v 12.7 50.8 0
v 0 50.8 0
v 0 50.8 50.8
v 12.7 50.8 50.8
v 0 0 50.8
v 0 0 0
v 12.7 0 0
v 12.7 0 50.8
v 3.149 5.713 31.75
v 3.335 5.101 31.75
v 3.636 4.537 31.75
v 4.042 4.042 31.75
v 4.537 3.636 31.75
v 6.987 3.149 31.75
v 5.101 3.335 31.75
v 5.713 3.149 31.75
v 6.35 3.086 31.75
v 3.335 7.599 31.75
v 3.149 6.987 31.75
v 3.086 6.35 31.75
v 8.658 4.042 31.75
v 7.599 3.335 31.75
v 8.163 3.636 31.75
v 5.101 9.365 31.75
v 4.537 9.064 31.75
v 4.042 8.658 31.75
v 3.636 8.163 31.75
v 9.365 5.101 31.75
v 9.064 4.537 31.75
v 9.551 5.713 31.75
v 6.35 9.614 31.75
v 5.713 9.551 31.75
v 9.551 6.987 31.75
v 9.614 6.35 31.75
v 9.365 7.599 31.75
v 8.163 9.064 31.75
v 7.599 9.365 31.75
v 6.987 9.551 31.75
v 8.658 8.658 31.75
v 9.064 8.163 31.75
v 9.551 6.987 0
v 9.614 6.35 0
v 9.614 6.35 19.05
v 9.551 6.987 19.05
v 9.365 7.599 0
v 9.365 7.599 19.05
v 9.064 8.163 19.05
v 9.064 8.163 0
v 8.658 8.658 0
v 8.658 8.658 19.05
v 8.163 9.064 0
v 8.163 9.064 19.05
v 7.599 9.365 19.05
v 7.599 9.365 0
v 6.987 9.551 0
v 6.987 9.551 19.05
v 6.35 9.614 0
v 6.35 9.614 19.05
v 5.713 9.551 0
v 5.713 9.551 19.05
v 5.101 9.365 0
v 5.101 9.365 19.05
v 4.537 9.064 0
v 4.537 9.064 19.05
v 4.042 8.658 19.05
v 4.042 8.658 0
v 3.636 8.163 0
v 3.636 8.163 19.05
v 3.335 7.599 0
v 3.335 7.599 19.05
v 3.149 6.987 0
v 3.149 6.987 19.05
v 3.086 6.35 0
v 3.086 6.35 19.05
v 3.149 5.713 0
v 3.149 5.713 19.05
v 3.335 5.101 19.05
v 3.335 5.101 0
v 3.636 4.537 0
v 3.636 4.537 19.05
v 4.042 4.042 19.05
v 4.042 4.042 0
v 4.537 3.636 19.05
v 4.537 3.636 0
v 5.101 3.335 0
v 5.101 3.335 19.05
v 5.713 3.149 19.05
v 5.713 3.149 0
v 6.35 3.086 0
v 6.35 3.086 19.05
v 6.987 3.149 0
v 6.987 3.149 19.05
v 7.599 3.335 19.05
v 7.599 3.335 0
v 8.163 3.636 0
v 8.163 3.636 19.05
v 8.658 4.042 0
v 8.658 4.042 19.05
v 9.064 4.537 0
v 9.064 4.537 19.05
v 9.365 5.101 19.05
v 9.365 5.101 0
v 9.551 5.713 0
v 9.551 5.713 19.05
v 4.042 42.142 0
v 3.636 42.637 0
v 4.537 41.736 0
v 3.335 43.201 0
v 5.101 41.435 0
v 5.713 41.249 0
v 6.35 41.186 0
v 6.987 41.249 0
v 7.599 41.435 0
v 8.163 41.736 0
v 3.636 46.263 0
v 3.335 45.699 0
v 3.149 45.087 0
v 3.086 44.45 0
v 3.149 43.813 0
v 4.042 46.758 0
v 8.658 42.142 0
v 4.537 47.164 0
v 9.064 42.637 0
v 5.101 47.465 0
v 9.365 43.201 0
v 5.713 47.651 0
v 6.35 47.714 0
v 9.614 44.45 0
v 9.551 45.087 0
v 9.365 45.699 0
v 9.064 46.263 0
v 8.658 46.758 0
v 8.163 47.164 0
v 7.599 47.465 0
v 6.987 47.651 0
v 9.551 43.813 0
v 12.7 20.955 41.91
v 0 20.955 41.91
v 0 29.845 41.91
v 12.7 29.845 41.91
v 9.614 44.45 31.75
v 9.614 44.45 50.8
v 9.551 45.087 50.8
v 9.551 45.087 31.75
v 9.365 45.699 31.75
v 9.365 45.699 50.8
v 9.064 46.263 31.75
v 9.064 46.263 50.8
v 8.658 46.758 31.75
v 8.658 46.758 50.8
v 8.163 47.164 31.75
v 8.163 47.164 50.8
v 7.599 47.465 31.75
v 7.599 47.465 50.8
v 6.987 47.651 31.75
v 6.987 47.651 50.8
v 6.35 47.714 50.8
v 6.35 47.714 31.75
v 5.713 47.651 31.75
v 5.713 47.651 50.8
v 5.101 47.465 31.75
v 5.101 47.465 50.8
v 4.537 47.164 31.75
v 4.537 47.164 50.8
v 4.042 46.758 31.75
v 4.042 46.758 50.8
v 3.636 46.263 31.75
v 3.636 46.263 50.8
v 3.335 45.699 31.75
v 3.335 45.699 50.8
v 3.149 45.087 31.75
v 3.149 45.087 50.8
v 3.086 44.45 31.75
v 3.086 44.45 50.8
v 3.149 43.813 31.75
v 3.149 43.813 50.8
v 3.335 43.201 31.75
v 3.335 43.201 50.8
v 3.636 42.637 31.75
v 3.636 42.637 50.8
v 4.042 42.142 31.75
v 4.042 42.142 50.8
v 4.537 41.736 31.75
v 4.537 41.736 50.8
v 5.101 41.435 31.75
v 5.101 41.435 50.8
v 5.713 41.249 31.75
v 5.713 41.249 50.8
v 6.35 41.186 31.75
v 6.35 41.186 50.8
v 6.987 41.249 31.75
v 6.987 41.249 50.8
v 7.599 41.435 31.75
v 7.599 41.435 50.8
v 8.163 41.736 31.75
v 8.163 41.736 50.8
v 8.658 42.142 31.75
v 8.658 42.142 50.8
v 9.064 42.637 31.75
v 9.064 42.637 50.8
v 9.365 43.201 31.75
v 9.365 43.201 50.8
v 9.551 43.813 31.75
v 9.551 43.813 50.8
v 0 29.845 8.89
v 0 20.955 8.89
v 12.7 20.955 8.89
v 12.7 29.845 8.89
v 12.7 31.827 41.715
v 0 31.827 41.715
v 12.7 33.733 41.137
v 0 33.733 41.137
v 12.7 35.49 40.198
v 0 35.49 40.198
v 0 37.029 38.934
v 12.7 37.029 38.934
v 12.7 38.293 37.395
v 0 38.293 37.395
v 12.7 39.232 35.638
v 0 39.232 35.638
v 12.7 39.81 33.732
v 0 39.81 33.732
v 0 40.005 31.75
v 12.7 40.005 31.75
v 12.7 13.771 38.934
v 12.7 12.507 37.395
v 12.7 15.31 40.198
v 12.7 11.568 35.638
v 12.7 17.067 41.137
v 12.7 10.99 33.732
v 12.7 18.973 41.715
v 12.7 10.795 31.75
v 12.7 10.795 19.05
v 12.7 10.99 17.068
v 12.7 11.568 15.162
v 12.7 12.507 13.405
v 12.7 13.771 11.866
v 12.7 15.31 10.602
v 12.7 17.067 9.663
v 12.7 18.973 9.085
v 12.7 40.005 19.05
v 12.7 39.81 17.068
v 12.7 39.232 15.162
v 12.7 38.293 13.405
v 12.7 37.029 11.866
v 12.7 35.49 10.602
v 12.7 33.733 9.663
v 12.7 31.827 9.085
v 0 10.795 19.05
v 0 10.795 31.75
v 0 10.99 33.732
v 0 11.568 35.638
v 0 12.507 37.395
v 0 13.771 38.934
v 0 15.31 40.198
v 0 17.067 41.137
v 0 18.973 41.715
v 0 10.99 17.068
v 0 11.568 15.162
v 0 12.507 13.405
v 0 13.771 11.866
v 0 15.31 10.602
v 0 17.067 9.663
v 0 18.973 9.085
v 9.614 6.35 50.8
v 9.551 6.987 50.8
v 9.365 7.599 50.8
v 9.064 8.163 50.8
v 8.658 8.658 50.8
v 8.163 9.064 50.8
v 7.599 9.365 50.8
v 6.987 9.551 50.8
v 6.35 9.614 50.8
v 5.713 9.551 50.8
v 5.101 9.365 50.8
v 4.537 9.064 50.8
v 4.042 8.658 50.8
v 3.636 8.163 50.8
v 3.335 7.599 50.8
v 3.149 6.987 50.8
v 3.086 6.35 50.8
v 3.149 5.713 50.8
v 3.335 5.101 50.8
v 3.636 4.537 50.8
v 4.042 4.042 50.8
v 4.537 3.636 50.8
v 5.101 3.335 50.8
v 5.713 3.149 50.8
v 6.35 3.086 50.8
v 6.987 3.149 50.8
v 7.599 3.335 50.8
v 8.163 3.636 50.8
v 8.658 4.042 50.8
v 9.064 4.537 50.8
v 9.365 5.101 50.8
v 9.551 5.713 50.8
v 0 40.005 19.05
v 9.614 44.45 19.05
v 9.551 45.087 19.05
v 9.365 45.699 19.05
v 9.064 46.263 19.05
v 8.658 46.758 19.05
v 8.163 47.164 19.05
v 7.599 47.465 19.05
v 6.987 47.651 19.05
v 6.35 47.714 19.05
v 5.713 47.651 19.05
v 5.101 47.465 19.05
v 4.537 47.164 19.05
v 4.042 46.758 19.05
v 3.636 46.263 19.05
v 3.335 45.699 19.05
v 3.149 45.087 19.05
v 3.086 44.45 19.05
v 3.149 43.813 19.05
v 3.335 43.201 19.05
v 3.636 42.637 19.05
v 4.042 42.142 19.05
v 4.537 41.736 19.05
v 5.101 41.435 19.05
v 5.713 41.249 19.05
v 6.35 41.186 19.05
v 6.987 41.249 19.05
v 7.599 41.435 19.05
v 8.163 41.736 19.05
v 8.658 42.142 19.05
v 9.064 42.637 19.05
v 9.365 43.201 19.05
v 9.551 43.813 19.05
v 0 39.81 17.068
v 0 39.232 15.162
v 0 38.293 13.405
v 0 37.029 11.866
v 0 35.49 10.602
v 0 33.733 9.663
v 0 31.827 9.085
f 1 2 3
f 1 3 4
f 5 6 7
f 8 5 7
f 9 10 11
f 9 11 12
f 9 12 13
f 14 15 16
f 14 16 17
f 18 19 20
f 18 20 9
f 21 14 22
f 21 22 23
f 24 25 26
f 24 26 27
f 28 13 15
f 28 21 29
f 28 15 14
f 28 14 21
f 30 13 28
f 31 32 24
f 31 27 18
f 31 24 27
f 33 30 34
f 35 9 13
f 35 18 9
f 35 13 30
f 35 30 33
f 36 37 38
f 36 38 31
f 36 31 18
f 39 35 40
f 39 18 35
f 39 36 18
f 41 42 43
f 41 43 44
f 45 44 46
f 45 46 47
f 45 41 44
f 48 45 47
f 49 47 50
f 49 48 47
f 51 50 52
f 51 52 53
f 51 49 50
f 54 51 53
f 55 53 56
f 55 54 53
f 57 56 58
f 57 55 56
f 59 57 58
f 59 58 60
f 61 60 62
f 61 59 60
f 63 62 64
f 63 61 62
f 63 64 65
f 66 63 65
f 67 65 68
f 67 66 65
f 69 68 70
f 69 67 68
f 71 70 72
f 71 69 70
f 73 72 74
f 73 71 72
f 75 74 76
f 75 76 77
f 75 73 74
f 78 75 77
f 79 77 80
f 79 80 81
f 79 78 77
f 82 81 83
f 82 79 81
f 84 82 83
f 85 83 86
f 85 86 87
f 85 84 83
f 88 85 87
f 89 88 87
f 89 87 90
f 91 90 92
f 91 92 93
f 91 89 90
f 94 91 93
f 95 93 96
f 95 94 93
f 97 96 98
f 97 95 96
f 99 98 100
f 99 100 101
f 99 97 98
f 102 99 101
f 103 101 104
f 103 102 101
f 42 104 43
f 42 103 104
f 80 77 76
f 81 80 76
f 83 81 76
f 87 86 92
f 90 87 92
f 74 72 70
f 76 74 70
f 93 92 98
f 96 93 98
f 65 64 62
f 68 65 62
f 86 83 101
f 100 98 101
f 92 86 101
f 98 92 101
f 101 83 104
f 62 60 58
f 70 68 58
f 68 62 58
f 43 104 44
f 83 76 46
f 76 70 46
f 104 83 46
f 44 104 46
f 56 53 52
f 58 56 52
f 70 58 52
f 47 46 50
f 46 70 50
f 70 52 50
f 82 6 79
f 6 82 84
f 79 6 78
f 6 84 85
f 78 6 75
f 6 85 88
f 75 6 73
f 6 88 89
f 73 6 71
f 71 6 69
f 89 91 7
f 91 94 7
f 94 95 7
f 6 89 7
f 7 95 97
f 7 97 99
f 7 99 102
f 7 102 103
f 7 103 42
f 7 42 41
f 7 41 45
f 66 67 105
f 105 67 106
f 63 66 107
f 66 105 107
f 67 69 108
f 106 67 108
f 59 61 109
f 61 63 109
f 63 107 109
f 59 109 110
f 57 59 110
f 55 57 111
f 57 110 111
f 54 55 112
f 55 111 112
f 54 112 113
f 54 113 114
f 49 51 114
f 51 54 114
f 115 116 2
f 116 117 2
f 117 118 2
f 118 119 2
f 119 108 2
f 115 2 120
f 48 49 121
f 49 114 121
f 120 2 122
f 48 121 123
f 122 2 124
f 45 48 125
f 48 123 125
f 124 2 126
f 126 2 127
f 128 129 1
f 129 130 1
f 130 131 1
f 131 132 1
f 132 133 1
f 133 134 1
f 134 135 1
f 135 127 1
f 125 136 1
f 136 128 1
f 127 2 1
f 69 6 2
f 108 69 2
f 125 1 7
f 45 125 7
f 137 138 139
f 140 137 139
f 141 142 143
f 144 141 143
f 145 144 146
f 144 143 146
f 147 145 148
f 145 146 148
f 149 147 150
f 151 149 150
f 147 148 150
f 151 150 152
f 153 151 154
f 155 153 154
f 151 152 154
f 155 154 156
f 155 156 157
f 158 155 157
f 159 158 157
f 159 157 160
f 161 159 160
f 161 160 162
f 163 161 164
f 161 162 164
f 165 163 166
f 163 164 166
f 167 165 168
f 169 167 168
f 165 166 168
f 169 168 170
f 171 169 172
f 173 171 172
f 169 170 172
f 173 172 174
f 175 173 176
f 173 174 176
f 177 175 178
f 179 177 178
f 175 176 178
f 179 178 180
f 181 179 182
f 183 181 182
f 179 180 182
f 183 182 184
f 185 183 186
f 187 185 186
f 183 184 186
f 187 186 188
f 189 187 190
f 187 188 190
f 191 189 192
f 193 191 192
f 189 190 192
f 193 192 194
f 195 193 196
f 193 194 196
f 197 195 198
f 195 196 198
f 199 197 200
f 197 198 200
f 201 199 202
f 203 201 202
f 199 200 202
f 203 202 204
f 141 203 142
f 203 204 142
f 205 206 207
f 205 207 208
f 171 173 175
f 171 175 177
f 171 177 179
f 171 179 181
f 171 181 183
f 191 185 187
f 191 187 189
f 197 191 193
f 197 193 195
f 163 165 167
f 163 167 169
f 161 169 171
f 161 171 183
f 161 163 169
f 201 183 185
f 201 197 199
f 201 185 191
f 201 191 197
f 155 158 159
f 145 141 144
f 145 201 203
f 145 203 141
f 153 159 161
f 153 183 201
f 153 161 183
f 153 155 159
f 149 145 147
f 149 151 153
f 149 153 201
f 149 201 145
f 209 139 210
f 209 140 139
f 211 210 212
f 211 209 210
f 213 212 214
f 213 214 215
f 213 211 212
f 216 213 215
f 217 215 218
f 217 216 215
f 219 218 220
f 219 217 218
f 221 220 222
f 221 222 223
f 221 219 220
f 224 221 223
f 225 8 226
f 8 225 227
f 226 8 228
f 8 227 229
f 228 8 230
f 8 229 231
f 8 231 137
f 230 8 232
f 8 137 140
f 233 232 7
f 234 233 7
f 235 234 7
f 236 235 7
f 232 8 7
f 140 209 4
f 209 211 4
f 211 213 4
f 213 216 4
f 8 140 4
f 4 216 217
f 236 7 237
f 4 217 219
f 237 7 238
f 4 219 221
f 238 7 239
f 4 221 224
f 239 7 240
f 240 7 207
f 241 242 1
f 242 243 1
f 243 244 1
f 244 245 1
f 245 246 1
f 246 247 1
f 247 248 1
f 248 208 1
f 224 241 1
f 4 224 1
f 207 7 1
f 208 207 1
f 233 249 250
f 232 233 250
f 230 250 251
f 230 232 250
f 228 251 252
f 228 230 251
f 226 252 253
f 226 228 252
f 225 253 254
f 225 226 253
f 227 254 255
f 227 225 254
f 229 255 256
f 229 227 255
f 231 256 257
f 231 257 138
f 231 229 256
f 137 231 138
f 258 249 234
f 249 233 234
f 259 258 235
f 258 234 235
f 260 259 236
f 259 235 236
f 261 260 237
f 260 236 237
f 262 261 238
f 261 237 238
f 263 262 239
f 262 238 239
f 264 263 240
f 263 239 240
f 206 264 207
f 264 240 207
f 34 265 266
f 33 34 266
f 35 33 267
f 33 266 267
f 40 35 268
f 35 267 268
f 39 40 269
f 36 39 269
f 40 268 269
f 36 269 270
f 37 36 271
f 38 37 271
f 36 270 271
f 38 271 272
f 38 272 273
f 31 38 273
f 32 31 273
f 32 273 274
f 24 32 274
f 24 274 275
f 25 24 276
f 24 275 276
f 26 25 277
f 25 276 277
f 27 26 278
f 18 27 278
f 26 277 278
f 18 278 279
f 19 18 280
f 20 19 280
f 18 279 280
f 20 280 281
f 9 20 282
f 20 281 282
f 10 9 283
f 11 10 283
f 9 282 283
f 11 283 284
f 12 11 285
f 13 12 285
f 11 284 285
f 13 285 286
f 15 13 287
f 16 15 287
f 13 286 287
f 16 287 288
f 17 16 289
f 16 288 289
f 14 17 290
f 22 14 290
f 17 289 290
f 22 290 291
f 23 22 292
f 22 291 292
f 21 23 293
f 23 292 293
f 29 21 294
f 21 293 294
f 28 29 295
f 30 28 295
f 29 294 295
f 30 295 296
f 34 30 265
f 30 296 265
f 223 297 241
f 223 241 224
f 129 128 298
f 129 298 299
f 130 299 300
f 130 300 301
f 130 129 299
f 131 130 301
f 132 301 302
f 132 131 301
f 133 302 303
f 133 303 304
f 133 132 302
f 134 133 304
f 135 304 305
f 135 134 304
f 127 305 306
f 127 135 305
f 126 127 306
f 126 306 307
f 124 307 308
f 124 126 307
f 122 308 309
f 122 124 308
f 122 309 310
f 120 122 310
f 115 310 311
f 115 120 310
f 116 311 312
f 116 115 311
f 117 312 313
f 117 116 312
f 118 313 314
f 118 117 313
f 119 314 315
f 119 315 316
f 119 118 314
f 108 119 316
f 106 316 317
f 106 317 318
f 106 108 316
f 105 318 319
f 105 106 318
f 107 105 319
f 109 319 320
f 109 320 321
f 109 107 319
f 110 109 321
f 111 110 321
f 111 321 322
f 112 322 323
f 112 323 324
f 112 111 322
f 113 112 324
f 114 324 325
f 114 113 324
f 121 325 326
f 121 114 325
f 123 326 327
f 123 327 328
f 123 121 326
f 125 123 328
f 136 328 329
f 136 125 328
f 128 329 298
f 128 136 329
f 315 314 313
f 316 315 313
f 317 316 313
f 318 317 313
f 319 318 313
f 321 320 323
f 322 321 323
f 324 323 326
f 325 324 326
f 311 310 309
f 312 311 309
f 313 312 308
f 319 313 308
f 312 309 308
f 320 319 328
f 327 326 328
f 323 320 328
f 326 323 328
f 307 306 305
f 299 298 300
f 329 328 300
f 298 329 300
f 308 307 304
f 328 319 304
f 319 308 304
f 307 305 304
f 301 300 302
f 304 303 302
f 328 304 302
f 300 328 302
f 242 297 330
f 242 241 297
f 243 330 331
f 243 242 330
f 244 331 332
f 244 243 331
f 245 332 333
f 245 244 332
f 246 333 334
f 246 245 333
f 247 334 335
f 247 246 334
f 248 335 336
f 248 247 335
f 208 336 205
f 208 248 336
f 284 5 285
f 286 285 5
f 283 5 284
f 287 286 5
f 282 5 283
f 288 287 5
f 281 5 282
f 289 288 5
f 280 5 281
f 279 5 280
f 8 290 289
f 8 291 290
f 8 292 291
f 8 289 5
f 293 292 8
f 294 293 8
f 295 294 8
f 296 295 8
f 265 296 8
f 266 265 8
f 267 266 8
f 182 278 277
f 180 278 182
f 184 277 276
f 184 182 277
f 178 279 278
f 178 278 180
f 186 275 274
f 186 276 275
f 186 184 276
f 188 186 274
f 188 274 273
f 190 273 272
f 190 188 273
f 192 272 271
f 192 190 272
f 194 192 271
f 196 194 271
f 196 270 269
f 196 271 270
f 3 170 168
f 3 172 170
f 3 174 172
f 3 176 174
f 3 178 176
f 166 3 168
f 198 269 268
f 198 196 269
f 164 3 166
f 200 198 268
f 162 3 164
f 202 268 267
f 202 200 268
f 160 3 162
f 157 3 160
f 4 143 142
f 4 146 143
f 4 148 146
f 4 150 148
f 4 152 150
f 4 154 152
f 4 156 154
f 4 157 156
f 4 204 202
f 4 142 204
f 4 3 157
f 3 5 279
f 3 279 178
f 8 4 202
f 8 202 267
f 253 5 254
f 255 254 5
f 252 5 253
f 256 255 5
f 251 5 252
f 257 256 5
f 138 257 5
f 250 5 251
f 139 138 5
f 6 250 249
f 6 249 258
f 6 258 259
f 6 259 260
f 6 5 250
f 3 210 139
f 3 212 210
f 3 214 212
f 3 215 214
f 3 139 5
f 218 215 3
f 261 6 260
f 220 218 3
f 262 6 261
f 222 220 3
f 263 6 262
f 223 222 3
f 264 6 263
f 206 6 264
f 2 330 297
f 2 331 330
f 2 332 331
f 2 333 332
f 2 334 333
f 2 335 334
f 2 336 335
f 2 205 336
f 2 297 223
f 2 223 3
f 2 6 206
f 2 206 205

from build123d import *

# Parameters (mm, degrees)
SKETCH1_W           = 12.7
SKETCH1_H           = 50.8
BOSS_EXTRUDE1_DEPTH = 50.8
SKETCH2_R           = 3.2639
CUT_EXTRUDE1_DEPTH  = 19.05
SKETCH3_W           = 33.02
SKETCH3_H           = 29.21
CUT_EXTRUDE2_DEPTH  = 13.7
FILLET1_R           = 10.16


with BuildPart() as part:
    # Sketch1 → Boss-Extrude1 (new body)
    with BuildSketch(Plane.XY):
        with Locations((6.35, 25.4)):
            Rectangle(SKETCH1_W, SKETCH1_H)
    extrude(amount=BOSS_EXTRUDE1_DEPTH)

    # Sketch2 → Cut-Extrude1 (cut)
    with BuildSketch(Plane.XY.offset(50.8)):
        with Locations((6.35, 44.45)):
            Circle(SKETCH2_R)
        with Locations((6.35, 6.35)):
            Circle(SKETCH2_R)
    cut_extrude1 = extrude(amount=-CUT_EXTRUDE1_DEPTH, mode=Mode.SUBTRACT)

    # Mirror1: Cut-Extrude1 across plane
    add(cut_extrude1.mirror(Plane.XY.offset(25.4)), mode=Mode.SUBTRACT)

    # Sketch3 → Cut-Extrude2 (cut, through all)
    with BuildSketch(Plane.ZY):
        with Locations((25.4, 25.4)):
            Rectangle(SKETCH3_W, SKETCH3_H)
    extrude(amount=-CUT_EXTRUDE2_DEPTH, mode=Mode.SUBTRACT)

    # Fillet1
    fillet1_edges = [part.edges().sort_by_distance(p)[0] for p in [
        (6.35, 10.795, 8.89),
        (6.35, 40.005, 8.89),
        (6.35, 40.005, 41.91),
        (6.35, 10.795, 41.91),
    ]]
    fillet(fillet1_edges, radius=FILLET1_R)


solid = part.part
